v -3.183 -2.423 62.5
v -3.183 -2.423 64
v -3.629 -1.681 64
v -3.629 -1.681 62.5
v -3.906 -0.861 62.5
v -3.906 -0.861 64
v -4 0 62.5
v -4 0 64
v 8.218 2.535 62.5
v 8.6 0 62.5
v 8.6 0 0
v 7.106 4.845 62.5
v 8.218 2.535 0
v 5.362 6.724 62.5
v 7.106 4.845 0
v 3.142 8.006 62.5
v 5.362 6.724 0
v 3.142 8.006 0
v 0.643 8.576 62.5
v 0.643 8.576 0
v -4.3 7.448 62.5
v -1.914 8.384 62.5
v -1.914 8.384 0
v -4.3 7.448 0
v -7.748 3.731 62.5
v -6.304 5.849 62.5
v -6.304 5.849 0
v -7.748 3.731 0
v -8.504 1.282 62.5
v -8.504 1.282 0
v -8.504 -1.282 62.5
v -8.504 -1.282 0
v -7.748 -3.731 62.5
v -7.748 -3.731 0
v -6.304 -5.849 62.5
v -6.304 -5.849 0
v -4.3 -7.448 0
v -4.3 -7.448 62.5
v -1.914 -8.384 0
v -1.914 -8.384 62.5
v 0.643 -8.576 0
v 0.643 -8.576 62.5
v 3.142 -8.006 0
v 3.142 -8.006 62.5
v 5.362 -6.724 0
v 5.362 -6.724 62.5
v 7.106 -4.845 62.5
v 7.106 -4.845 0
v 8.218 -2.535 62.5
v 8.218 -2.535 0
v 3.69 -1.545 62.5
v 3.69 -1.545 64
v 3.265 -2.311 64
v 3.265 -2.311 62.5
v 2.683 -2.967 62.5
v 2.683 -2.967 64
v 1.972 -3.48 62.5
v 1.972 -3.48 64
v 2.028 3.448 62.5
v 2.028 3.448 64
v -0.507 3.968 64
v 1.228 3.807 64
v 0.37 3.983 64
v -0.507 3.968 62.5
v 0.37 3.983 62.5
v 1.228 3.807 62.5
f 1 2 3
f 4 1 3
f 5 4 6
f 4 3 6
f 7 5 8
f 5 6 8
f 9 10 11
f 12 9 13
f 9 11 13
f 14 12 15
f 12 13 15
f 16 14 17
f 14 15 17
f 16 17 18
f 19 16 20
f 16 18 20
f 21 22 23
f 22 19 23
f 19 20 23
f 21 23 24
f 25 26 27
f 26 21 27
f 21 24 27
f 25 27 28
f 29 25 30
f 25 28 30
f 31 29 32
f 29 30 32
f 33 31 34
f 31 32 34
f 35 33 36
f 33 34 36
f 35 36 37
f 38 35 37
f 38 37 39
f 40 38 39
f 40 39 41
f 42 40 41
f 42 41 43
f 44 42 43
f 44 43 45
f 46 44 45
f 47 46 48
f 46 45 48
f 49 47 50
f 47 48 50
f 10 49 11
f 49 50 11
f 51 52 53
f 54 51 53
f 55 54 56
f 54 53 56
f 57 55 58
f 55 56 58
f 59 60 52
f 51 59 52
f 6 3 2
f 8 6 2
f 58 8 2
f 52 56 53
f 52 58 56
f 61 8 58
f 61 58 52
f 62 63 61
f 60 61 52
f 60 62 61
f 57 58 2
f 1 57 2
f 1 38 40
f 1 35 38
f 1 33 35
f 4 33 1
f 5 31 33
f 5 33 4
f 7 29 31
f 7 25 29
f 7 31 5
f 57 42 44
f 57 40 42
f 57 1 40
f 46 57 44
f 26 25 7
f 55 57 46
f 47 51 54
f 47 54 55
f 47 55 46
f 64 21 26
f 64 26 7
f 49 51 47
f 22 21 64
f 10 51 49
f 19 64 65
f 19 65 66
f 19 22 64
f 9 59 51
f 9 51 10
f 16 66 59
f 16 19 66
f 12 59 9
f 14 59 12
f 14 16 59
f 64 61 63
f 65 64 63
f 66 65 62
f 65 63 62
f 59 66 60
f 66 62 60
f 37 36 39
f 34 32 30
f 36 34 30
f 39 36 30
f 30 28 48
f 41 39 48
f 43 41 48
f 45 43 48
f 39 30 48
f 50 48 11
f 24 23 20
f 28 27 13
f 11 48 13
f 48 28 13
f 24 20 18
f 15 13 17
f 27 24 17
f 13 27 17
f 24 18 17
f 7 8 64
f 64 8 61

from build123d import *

# Parameters (mm, degrees)
SKETCH_1_R          = 8.6
EXTRUDE_1_DEPTH     = 64
SKETCH_2_OUTSIDE_W  = 32.894
SKETCH_2_OUTSIDE_H  = 32.894
CUT_EXTRUDE_1_DEPTH = 1.5


with BuildPart() as part:
    # Эскиз1 → Бобышка-Вытянуть1 (new body)
    with BuildSketch(Plane.XY):
        Circle(SKETCH_1_R)
    extrude(amount=EXTRUDE_1_DEPTH)

    # Эскиз2 outside → Вырез-Вытянуть1 (cut)
    with BuildSketch(Plane.XY.offset(64)):
        Rectangle(SKETCH_2_OUTSIDE_W, SKETCH_2_OUTSIDE_H)
        with BuildLine():
            Line((2.028187196, 3.4476741), (3.689688099, -1.544733546))
            ThreePointArc((3.689688099, -1.544733546), (2.991550535, -2.655301376), (1.971679756, -3.480298685))
            Line((1.971679756, -3.480298685), (-3.182622543, -2.422996853))
            ThreePointArc((-3.182622543, -2.422996853), (-3.790151064, -1.278575346), (-4, 0))
            Line((-4, 0), (-0.507065556, 3.967730399))
            ThreePointArc((-0.507065556, 3.967730399), (0.803783179, 3.918409448), (2.028187196, 3.4476741))
        make_face(mode=Mode.SUBTRACT)
    extrude(amount=-CUT_EXTRUDE_1_DEPTH, mode=Mode.SUBTRACT)


solid = part.part
